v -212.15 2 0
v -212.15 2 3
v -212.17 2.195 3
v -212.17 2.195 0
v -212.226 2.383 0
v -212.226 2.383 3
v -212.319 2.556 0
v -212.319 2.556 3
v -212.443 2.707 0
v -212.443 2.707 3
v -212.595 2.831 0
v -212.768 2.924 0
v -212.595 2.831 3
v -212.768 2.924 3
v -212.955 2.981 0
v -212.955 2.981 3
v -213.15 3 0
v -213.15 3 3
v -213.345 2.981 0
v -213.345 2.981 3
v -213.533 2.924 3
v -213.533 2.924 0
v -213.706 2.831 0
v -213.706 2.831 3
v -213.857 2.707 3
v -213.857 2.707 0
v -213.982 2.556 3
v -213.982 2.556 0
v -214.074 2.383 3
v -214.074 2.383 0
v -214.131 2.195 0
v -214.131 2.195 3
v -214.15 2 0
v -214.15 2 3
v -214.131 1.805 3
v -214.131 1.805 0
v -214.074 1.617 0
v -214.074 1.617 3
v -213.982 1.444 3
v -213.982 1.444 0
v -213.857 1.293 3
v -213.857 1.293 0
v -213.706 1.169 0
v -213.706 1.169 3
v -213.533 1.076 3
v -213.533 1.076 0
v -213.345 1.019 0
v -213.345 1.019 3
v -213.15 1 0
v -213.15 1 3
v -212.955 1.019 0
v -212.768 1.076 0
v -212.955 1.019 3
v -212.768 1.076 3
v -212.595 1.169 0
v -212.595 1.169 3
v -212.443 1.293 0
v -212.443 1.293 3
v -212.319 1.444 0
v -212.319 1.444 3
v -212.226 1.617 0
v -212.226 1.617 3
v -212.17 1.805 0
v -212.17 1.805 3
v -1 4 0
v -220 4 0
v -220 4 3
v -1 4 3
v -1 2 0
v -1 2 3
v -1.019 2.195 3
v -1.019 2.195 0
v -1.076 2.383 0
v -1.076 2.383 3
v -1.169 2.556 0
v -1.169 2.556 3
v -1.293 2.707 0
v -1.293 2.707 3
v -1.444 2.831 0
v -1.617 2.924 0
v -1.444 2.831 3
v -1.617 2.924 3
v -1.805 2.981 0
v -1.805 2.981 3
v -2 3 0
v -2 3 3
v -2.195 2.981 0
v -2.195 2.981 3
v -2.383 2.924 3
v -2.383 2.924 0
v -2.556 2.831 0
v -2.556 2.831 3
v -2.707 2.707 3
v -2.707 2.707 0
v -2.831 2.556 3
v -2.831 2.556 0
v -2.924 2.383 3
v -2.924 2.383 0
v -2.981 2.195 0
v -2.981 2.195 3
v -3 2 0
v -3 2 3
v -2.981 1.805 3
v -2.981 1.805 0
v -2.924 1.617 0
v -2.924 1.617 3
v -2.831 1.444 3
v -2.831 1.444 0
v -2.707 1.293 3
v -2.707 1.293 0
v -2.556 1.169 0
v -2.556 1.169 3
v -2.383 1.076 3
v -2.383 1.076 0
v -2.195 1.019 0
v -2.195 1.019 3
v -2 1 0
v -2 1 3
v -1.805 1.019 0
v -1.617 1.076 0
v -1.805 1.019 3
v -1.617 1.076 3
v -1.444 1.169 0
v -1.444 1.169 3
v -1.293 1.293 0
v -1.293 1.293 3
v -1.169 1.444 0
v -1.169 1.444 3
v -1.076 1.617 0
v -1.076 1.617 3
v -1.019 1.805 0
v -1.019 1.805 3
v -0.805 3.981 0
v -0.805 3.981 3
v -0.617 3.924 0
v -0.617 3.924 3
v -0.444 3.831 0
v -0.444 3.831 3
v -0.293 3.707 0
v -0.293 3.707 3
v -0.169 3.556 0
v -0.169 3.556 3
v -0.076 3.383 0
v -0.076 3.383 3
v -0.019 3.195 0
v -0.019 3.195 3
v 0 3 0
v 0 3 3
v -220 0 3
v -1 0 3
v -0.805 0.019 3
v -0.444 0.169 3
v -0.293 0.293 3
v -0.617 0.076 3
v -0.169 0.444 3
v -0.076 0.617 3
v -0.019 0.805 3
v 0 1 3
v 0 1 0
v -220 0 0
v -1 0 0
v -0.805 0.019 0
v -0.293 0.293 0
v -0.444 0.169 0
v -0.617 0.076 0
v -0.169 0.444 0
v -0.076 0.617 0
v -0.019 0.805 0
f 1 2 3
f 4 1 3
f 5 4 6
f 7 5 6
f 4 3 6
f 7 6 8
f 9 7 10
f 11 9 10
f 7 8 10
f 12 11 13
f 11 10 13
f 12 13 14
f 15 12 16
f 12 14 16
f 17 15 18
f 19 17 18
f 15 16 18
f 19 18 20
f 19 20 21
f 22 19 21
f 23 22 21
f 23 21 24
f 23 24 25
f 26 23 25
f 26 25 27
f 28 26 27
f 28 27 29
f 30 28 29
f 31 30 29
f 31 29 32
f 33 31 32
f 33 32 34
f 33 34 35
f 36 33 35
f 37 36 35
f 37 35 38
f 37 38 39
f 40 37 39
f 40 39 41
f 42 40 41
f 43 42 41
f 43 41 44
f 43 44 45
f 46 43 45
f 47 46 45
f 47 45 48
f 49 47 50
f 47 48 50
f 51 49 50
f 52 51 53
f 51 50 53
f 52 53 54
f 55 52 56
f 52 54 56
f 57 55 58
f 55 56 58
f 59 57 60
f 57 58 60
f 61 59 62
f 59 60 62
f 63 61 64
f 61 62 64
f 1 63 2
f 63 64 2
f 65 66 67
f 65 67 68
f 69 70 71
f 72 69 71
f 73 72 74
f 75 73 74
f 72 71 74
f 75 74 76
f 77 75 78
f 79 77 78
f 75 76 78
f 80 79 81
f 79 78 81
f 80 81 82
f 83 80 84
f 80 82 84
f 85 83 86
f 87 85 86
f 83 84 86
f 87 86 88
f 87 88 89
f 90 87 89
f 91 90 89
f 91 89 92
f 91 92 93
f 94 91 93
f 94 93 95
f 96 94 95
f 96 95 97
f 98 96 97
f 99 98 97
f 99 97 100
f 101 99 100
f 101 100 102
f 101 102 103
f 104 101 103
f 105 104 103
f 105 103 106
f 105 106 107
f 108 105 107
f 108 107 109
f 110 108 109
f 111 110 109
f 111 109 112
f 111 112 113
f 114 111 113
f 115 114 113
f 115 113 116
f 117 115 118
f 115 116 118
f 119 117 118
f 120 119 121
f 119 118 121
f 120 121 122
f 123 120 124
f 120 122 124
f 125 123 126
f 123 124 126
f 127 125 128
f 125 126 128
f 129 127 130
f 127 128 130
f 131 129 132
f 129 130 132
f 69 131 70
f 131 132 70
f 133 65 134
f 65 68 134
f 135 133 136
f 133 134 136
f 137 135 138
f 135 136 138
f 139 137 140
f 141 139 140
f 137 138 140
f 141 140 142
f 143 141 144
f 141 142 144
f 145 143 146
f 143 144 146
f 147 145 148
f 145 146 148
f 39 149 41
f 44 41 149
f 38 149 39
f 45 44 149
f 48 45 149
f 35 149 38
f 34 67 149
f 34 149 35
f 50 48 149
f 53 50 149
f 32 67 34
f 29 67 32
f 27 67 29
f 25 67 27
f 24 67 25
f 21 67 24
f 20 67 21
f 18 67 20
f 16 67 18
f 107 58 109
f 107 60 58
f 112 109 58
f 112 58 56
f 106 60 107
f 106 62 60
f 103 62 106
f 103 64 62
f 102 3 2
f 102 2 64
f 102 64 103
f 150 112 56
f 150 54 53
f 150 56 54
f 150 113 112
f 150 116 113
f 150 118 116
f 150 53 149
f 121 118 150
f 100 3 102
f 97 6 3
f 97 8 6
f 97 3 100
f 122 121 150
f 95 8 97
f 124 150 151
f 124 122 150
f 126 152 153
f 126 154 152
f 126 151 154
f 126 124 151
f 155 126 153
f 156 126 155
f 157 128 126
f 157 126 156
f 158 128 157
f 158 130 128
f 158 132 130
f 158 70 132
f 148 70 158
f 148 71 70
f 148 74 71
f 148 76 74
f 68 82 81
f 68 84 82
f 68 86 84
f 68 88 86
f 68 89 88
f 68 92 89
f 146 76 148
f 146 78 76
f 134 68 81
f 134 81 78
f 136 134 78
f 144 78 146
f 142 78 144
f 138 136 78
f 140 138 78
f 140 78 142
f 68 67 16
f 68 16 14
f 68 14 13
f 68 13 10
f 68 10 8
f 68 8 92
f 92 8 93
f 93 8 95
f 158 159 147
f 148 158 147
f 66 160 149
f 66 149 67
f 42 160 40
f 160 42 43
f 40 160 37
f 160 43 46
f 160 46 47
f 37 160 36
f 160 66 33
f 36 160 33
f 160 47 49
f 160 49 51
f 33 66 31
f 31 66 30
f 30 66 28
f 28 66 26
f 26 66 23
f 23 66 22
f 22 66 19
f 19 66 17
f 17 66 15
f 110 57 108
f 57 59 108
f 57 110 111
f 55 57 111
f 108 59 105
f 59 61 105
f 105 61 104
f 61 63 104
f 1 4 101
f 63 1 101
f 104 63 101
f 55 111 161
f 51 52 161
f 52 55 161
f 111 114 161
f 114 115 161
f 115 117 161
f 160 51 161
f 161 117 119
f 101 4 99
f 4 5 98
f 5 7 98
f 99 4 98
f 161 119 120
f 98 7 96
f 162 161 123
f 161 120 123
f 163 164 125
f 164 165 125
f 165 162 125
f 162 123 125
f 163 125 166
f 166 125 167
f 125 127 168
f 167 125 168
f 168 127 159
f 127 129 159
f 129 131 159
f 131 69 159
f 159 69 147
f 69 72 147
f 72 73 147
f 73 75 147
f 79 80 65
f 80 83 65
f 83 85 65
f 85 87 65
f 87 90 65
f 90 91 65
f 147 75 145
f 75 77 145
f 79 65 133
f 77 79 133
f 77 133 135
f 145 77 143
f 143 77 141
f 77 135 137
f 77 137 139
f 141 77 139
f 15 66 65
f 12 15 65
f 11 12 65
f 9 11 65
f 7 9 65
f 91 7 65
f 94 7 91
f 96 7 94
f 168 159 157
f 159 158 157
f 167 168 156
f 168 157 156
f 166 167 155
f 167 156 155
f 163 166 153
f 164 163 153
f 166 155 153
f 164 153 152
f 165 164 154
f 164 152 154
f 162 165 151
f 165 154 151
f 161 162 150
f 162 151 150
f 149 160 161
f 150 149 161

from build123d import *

# Parameters (mm, degrees)
ESQUISSE1_W             = 220
ESQUISSE1_H             = 4
BOSS_EXTRU_1_DEPTH      = 3
ESQUISSE2_R             = 1
ENL_V_MAT_EXTRU_1_DEPTH = 6
CONG_1_R                = 1
CONG_2_R                = 1


with BuildPart() as part:
    # Esquisse1 → Boss.-Extru.1 (new body)
    with BuildSketch(Plane.XY):
        with Locations((-110, 2)):
            Rectangle(ESQUISSE1_W, ESQUISSE1_H)
    extrude(amount=BOSS_EXTRU_1_DEPTH)

    # Esquisse2 → Enlèv. mat.-Extru.1 (cut)
    with BuildSketch(Plane.XY.offset(3)):
        with Locations((-2, 2)):
            Circle(ESQUISSE2_R)
        with Locations((-213.150378979, 2)):
            Circle(ESQUISSE2_R)
    extrude(amount=-ENL_V_MAT_EXTRU_1_DEPTH, mode=Mode.SUBTRACT)

    # Congé1
    cong_1_edges = [part.edges().sort_by_distance(p)[0] for p in [
        (0, 4, 1.5),
    ]]
    fillet(cong_1_edges, radius=CONG_1_R)

    # Congé2
    cong_2_edges = [part.edges().sort_by_distance(p)[0] for p in [
        (0, 0, 1.5),
    ]]
    fillet(cong_2_edges, radius=CONG_2_R)


solid = part.part
